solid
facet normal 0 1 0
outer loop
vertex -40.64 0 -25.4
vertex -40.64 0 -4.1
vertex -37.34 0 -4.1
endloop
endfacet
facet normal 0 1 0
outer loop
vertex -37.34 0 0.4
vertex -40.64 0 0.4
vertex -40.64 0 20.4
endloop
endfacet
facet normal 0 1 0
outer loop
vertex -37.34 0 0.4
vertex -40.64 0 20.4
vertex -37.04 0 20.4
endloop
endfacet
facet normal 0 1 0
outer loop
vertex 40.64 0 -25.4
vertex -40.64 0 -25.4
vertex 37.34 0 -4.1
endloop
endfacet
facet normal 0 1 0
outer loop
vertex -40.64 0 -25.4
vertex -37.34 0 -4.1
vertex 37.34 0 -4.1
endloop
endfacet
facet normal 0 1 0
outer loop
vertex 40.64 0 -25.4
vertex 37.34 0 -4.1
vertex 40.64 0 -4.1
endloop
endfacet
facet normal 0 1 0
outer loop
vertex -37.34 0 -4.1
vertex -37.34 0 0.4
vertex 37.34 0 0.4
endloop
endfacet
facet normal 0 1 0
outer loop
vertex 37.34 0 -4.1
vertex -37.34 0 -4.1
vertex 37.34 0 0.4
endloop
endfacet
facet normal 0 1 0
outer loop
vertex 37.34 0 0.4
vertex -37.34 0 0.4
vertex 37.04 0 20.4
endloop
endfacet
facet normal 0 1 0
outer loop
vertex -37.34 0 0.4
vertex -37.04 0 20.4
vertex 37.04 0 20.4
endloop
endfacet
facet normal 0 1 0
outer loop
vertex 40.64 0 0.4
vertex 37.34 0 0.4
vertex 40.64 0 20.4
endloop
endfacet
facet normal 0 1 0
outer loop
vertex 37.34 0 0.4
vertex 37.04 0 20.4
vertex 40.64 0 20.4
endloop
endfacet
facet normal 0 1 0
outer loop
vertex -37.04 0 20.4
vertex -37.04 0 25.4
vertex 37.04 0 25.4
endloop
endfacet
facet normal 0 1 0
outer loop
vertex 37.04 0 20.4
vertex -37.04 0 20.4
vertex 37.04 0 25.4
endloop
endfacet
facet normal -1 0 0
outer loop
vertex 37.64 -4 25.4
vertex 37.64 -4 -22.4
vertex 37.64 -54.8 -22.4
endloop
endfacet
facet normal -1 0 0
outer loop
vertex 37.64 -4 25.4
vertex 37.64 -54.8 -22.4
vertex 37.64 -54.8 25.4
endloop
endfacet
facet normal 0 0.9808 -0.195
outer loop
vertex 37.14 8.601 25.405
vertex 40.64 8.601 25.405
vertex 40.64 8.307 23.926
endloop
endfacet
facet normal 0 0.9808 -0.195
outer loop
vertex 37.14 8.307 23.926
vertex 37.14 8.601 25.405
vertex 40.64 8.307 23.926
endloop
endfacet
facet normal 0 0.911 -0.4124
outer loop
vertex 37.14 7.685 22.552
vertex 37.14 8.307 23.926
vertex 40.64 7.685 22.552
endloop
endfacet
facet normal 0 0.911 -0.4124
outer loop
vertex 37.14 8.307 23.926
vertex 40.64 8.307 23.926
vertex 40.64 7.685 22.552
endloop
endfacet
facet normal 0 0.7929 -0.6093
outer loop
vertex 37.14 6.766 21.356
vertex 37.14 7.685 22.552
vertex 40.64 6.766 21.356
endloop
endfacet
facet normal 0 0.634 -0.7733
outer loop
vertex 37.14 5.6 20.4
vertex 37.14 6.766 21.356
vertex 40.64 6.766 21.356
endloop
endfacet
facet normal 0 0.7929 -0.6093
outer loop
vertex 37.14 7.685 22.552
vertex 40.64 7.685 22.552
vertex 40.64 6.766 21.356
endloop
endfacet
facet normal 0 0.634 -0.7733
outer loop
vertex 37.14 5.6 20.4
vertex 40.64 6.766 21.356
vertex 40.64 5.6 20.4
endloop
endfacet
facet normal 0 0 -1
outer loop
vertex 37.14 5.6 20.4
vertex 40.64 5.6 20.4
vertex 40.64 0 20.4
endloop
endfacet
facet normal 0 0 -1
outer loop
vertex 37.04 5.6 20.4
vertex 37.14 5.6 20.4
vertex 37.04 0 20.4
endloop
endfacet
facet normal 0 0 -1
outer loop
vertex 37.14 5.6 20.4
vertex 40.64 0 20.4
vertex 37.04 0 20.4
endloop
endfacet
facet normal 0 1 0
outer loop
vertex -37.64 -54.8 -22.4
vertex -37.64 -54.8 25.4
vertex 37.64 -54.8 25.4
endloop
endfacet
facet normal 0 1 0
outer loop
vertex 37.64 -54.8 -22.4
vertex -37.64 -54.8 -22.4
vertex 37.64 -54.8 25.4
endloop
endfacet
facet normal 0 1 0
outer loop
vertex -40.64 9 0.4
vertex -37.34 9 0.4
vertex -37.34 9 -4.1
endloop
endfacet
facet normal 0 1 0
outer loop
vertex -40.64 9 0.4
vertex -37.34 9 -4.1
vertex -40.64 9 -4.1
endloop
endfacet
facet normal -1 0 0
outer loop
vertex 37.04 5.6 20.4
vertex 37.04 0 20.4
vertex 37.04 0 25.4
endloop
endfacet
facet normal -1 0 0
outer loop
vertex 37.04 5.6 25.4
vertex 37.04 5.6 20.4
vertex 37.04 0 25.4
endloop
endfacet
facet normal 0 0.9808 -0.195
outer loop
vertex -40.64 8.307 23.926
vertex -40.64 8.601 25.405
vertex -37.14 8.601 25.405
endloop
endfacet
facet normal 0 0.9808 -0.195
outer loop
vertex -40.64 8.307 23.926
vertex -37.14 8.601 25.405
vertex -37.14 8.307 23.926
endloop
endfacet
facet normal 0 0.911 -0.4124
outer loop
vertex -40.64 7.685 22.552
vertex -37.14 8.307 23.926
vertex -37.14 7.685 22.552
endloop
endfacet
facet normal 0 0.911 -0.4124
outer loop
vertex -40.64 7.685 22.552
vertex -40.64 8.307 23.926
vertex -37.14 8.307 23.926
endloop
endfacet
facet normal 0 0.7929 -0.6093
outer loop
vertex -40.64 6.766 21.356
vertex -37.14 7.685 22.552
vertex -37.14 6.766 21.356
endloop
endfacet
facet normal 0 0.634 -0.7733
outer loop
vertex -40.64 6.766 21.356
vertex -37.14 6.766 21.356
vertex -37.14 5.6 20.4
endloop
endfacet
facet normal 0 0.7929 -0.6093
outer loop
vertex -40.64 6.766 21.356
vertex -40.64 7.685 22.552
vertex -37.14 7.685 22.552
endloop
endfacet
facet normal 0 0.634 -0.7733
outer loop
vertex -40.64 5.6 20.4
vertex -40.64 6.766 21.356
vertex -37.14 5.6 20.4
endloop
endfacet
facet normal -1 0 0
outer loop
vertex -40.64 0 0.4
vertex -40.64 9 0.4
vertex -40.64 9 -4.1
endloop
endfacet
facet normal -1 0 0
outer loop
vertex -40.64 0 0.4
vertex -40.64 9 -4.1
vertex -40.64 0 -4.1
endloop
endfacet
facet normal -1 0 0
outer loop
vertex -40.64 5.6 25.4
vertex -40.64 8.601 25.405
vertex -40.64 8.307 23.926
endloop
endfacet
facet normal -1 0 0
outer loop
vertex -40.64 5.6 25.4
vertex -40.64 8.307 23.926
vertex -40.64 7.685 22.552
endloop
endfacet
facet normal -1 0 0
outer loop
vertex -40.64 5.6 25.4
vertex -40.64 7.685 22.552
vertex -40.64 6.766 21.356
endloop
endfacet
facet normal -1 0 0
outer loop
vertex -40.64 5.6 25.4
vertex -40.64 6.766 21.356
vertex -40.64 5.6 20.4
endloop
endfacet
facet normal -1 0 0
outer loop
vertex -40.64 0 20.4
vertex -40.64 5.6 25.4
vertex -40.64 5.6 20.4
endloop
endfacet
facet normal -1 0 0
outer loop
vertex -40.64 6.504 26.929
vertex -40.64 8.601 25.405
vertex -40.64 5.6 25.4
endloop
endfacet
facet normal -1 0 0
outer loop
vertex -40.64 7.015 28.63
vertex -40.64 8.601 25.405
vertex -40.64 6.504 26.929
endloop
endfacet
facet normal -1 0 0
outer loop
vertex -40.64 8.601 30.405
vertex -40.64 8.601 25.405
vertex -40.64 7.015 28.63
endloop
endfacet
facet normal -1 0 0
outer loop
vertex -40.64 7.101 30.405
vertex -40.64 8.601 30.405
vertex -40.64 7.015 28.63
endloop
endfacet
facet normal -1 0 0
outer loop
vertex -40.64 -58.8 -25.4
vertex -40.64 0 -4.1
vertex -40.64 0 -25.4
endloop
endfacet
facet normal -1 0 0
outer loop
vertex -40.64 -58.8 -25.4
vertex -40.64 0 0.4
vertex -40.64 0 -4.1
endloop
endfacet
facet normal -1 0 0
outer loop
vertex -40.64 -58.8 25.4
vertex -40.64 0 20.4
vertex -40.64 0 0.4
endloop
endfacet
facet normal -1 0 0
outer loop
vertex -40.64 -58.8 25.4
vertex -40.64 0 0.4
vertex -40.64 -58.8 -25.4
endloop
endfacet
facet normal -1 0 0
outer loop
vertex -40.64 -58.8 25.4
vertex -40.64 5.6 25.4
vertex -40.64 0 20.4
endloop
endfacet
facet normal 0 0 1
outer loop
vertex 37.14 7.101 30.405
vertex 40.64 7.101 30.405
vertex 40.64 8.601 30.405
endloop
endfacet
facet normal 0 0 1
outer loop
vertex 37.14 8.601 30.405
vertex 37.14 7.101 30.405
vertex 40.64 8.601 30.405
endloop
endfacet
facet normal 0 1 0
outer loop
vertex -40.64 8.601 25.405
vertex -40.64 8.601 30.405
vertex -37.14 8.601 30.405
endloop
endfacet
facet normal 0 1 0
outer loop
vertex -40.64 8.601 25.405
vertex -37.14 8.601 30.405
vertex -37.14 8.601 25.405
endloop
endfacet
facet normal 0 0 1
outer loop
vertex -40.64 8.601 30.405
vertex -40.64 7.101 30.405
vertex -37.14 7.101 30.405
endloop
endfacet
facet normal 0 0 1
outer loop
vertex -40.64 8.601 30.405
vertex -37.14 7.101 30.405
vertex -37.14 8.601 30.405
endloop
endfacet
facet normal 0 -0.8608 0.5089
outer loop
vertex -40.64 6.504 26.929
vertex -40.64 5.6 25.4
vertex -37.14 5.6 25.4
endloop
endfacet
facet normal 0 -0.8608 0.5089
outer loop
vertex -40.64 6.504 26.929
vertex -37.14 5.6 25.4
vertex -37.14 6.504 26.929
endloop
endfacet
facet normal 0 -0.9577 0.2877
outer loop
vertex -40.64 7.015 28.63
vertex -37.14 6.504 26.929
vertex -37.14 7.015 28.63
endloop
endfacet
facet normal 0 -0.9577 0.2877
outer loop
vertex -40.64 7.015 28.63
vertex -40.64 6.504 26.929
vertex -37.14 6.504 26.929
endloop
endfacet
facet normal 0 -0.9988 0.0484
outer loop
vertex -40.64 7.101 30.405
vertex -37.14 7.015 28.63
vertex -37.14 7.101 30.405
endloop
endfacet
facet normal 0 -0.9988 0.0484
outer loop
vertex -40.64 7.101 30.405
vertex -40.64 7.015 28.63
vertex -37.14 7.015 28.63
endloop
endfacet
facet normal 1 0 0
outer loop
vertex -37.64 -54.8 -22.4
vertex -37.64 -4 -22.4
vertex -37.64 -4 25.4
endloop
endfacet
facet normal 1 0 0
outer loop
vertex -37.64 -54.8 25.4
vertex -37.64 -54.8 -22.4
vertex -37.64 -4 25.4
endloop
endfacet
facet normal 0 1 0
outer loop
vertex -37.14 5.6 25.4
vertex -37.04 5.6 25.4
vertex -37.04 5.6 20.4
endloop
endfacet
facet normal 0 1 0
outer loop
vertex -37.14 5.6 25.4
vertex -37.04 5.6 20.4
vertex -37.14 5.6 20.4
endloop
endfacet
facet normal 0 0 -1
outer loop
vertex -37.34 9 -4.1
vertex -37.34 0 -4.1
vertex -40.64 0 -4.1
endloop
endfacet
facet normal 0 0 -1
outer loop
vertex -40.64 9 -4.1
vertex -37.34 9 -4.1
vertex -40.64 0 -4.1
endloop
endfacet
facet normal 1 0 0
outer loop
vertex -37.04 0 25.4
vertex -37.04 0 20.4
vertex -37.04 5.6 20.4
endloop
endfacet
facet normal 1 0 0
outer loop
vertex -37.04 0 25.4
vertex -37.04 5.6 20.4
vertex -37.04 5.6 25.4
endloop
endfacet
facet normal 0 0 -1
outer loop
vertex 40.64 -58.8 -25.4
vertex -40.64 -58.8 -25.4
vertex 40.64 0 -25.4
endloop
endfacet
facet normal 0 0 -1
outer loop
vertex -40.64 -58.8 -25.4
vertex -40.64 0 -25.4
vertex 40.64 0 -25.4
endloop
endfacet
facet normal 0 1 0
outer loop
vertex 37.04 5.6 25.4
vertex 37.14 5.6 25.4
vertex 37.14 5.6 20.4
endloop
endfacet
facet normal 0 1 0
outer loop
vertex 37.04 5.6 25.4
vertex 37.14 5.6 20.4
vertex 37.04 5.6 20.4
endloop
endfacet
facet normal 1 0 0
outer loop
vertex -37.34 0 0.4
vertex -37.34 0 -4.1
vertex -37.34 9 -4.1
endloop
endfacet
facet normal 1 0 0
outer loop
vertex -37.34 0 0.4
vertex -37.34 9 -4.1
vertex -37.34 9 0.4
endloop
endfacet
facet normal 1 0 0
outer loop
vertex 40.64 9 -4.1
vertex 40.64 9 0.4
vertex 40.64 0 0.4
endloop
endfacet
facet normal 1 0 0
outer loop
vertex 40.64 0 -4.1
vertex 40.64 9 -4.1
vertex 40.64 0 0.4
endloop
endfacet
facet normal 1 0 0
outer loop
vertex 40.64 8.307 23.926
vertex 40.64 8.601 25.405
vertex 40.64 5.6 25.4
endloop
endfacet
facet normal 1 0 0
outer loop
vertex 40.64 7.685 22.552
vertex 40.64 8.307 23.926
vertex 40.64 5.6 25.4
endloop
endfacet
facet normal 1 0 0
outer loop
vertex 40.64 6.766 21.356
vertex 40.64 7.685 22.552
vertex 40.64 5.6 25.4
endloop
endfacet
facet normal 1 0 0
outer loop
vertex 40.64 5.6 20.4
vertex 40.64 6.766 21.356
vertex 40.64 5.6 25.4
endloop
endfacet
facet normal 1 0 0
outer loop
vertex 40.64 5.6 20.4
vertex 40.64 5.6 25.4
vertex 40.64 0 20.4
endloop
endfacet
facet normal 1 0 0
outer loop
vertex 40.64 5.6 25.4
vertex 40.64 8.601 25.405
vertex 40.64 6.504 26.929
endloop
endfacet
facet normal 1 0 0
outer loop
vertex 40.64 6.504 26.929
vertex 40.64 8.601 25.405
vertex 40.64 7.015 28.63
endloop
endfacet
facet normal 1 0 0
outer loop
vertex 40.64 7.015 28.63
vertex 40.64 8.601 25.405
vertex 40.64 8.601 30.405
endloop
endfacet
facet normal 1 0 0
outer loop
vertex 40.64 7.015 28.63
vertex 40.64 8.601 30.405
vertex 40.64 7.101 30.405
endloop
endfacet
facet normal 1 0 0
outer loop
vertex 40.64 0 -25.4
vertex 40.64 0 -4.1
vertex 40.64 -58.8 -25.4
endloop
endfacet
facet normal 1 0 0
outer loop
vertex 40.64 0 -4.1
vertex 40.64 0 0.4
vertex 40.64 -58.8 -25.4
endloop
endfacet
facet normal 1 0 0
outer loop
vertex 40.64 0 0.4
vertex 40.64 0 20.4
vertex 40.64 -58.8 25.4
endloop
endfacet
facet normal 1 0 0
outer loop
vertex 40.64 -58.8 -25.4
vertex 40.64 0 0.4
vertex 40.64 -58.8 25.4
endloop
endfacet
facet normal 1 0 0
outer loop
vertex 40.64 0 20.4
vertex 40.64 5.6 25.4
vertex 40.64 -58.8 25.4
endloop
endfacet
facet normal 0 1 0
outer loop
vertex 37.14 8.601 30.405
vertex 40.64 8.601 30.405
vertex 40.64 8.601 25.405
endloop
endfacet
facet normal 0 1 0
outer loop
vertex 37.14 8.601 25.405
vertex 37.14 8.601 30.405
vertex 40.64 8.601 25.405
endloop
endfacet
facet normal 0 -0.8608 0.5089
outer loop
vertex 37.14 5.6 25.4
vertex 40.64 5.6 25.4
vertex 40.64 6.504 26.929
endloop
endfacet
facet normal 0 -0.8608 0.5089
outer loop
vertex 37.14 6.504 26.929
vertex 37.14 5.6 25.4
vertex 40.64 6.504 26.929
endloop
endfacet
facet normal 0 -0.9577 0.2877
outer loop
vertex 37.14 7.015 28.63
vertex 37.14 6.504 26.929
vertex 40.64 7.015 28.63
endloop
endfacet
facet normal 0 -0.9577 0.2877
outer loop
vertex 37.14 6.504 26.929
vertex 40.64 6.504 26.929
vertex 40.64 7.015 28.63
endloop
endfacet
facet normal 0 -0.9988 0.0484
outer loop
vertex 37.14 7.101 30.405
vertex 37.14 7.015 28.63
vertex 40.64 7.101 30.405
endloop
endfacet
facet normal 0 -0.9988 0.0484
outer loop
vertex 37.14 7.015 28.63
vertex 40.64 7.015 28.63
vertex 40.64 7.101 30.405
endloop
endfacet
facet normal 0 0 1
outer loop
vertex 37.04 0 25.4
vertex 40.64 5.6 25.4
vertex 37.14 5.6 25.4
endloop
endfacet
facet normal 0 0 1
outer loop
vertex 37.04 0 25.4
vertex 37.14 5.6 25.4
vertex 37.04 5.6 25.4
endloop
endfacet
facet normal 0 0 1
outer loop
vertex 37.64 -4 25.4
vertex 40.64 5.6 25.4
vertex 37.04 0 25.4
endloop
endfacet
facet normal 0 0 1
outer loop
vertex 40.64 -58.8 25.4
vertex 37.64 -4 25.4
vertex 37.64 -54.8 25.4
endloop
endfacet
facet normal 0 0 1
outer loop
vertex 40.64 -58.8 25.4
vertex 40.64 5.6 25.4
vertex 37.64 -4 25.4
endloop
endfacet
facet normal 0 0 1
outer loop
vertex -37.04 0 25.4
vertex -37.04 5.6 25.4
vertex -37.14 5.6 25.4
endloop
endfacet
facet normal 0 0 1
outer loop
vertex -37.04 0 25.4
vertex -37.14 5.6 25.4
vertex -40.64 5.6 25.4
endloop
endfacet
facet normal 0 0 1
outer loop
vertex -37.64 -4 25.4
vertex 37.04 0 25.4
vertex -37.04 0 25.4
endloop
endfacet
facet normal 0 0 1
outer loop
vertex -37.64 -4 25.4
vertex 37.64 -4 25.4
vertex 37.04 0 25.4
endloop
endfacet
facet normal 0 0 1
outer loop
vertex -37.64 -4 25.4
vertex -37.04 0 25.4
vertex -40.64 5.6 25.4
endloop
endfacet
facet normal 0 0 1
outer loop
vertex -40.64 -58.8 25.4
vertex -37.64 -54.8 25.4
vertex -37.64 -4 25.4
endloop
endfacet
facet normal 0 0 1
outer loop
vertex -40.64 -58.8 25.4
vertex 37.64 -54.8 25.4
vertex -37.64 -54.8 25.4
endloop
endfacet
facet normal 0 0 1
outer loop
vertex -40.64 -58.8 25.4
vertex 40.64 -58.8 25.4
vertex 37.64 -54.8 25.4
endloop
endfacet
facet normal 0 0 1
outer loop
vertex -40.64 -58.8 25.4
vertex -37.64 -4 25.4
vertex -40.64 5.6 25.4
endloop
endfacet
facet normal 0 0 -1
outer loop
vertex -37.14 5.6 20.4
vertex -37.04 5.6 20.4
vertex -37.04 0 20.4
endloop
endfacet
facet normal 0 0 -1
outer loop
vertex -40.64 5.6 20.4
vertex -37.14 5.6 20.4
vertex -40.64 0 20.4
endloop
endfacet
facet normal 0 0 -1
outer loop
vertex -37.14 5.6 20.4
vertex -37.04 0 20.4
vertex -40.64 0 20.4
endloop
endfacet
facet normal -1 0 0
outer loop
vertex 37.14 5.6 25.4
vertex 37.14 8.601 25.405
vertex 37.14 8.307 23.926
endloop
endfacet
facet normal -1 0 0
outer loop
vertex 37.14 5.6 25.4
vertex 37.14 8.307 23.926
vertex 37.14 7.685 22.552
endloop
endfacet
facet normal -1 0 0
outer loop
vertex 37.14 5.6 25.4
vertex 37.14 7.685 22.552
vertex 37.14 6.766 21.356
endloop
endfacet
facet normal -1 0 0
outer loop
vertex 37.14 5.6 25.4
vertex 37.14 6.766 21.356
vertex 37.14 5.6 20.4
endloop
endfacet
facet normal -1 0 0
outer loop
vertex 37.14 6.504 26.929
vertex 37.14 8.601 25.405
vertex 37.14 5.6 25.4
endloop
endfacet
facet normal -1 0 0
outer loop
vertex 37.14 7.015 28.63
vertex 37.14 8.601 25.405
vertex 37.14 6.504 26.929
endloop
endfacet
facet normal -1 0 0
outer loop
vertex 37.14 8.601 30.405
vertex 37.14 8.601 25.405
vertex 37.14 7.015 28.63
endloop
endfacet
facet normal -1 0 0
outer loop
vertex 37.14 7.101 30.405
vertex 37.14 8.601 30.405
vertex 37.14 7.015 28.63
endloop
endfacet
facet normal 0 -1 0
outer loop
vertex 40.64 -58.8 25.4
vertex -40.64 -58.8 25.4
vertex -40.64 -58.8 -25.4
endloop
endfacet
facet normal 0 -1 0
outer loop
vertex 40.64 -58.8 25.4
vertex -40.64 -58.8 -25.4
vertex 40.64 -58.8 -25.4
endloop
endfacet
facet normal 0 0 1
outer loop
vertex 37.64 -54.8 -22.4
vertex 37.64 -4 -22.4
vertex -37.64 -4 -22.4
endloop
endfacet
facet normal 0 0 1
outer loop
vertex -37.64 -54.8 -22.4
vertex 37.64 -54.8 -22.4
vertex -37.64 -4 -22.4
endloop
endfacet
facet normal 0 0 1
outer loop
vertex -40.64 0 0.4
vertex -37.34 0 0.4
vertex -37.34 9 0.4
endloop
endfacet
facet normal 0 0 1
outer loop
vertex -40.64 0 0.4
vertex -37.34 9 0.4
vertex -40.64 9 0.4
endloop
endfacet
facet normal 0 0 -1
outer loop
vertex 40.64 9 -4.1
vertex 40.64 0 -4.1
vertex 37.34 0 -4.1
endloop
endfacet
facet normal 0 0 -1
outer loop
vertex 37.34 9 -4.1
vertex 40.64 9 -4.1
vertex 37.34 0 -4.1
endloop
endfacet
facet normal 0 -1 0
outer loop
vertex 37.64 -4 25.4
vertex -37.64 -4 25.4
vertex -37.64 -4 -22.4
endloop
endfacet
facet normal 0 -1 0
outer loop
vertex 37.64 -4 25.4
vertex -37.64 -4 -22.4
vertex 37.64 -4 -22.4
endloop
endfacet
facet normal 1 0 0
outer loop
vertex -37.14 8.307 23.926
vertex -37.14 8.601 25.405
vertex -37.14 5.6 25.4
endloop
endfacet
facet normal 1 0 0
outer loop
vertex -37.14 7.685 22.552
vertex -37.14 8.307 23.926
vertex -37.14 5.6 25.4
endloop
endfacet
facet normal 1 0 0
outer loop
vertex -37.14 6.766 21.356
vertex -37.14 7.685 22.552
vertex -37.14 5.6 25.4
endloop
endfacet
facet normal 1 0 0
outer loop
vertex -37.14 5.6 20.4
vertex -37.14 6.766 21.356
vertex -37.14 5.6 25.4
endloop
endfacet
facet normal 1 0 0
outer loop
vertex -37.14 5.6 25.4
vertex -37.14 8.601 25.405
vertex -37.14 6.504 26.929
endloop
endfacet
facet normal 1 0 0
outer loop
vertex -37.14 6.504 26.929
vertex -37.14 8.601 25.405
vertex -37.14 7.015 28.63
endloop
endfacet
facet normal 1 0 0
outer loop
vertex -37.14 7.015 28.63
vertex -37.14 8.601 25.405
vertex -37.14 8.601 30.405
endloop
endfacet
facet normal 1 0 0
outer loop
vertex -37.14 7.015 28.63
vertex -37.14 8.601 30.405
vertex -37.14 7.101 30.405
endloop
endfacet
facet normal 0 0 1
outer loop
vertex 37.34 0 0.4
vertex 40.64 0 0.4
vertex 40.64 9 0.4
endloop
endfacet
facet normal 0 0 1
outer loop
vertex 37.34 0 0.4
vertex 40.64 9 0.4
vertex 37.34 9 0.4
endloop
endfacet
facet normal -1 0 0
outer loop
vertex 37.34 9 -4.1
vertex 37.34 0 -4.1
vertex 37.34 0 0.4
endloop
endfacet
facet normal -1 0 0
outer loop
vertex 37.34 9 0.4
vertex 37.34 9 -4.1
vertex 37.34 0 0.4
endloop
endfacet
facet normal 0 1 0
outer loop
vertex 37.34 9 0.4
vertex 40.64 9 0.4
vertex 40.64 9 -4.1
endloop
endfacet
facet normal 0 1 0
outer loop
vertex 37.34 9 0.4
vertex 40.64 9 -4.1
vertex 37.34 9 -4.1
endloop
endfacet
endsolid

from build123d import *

# Parameters (mm, degrees)
F0_W      = 81.28
F0_H      = 50.8
F1_DEPTH  = 4
F2_W      = 3
F2_H      = 47.8
F2_H_2    = 3
F2_W_2    = 75.28
F3_DEPTH  = 50.8
F4_W      = 75.28
F4_H      = 47.8
F5_DEPTH  = 4
F6_W      = 3.6
F6_H      = 5
F7_DEPTH  = 5.6
F9_W      = 3.3
F9_H      = 4.5
F10_DEPTH = 9
F11_DEPTH = 3.5


with BuildPart() as f1:
    # F0 (on Front) → F1 (new body)
    with BuildSketch(Plane.XZ):
        Rectangle(F0_W, F0_H)
    extrude(amount=F1_DEPTH)

    # F2 (on face) → F3 (join)
    with BuildSketch(Plane.XZ.offset(4)):
        with Locations((-39.14, 1.5)):
            Rectangle(F2_W, F2_H)
        with Locations((-39.14, -23.9)):
            Rectangle(F2_W, F2_H_2)
        with Locations((0, -23.9)):
            Rectangle(F2_W_2, F2_H_2)
        with Locations((39.14, -23.9)):
            Rectangle(F2_W, F2_H_2)
        with Locations((39.14, 1.5)):
            Rectangle(F2_W, F2_H)
    extrude(amount=F3_DEPTH)

    # F4 (on face) → F5 (join)
    with BuildSketch(Plane.XZ.offset(54.8)):
        Polygon((-40.64, 25.4), (-40.64, -25.4), (40.64, -25.4), (40.64, 25.4), (37.64, 25.4), (37.64, -22.4), (-37.64, -22.4), (-37.64, 25.4), align=None)
        with Locations((0, 1.5)):
            Rectangle(F4_W, F4_H)
    extrude(amount=F5_DEPTH)

    # F6 (on face) → F7 (join)
    with BuildSketch(Plane(origin=(0, 0, 0), x_dir=(-1, 0, 0), z_dir=(0, 1, 0))):
        with Locations((-38.84, 22.9)):
            Rectangle(F6_W, F6_H)
        with Locations((38.84, 22.9)):
            Rectangle(F6_W, F6_H)
    extrude(amount=F7_DEPTH)

    # F9 (on face) → F10 (join)
    with BuildSketch(Plane(origin=(0, 0, 0), x_dir=(-1, 0, 0), z_dir=(0, 1, 0))):
        with Locations((38.99, -1.85)):
            Rectangle(F9_W, F9_H)
        with Locations((-38.99, -1.85)):
            Rectangle(F9_W, F9_H)
    extrude(amount=F10_DEPTH)

    # F8 (on face) → F11 (join)
    with BuildSketch(Plane(origin=(-40.64, 0, 0), x_dir=(0, -1, 0), z_dir=(-1, 0, 0))):
        with BuildLine():
            Line((-8.6013965008, 30.4046550027), (-8.6013965008, 25.4046550027))
            ThreePointArc((-8.6013965008, 25.4046550027), (-7.6846062869, 22.5521456134), (-5.6, 20.4))
            Line((-5.6, 20.4), (-5.6, 25.4))
            ThreePointArc((-5.6, 25.4), (-6.8110562613, 27.7642200981), (-7.1013965008, 30.4046550027))
            Line((-7.1013965008, 30.4046550027), (-8.6013965008, 30.4046550027))
        make_face()
    extrude(amount=-F11_DEPTH)

    # F12: F1 across plane


with BuildPart() as f1_1:
    add(f1.part)
    add(f1.part.mirror(Plane.YZ))


solid = f1_1.part
